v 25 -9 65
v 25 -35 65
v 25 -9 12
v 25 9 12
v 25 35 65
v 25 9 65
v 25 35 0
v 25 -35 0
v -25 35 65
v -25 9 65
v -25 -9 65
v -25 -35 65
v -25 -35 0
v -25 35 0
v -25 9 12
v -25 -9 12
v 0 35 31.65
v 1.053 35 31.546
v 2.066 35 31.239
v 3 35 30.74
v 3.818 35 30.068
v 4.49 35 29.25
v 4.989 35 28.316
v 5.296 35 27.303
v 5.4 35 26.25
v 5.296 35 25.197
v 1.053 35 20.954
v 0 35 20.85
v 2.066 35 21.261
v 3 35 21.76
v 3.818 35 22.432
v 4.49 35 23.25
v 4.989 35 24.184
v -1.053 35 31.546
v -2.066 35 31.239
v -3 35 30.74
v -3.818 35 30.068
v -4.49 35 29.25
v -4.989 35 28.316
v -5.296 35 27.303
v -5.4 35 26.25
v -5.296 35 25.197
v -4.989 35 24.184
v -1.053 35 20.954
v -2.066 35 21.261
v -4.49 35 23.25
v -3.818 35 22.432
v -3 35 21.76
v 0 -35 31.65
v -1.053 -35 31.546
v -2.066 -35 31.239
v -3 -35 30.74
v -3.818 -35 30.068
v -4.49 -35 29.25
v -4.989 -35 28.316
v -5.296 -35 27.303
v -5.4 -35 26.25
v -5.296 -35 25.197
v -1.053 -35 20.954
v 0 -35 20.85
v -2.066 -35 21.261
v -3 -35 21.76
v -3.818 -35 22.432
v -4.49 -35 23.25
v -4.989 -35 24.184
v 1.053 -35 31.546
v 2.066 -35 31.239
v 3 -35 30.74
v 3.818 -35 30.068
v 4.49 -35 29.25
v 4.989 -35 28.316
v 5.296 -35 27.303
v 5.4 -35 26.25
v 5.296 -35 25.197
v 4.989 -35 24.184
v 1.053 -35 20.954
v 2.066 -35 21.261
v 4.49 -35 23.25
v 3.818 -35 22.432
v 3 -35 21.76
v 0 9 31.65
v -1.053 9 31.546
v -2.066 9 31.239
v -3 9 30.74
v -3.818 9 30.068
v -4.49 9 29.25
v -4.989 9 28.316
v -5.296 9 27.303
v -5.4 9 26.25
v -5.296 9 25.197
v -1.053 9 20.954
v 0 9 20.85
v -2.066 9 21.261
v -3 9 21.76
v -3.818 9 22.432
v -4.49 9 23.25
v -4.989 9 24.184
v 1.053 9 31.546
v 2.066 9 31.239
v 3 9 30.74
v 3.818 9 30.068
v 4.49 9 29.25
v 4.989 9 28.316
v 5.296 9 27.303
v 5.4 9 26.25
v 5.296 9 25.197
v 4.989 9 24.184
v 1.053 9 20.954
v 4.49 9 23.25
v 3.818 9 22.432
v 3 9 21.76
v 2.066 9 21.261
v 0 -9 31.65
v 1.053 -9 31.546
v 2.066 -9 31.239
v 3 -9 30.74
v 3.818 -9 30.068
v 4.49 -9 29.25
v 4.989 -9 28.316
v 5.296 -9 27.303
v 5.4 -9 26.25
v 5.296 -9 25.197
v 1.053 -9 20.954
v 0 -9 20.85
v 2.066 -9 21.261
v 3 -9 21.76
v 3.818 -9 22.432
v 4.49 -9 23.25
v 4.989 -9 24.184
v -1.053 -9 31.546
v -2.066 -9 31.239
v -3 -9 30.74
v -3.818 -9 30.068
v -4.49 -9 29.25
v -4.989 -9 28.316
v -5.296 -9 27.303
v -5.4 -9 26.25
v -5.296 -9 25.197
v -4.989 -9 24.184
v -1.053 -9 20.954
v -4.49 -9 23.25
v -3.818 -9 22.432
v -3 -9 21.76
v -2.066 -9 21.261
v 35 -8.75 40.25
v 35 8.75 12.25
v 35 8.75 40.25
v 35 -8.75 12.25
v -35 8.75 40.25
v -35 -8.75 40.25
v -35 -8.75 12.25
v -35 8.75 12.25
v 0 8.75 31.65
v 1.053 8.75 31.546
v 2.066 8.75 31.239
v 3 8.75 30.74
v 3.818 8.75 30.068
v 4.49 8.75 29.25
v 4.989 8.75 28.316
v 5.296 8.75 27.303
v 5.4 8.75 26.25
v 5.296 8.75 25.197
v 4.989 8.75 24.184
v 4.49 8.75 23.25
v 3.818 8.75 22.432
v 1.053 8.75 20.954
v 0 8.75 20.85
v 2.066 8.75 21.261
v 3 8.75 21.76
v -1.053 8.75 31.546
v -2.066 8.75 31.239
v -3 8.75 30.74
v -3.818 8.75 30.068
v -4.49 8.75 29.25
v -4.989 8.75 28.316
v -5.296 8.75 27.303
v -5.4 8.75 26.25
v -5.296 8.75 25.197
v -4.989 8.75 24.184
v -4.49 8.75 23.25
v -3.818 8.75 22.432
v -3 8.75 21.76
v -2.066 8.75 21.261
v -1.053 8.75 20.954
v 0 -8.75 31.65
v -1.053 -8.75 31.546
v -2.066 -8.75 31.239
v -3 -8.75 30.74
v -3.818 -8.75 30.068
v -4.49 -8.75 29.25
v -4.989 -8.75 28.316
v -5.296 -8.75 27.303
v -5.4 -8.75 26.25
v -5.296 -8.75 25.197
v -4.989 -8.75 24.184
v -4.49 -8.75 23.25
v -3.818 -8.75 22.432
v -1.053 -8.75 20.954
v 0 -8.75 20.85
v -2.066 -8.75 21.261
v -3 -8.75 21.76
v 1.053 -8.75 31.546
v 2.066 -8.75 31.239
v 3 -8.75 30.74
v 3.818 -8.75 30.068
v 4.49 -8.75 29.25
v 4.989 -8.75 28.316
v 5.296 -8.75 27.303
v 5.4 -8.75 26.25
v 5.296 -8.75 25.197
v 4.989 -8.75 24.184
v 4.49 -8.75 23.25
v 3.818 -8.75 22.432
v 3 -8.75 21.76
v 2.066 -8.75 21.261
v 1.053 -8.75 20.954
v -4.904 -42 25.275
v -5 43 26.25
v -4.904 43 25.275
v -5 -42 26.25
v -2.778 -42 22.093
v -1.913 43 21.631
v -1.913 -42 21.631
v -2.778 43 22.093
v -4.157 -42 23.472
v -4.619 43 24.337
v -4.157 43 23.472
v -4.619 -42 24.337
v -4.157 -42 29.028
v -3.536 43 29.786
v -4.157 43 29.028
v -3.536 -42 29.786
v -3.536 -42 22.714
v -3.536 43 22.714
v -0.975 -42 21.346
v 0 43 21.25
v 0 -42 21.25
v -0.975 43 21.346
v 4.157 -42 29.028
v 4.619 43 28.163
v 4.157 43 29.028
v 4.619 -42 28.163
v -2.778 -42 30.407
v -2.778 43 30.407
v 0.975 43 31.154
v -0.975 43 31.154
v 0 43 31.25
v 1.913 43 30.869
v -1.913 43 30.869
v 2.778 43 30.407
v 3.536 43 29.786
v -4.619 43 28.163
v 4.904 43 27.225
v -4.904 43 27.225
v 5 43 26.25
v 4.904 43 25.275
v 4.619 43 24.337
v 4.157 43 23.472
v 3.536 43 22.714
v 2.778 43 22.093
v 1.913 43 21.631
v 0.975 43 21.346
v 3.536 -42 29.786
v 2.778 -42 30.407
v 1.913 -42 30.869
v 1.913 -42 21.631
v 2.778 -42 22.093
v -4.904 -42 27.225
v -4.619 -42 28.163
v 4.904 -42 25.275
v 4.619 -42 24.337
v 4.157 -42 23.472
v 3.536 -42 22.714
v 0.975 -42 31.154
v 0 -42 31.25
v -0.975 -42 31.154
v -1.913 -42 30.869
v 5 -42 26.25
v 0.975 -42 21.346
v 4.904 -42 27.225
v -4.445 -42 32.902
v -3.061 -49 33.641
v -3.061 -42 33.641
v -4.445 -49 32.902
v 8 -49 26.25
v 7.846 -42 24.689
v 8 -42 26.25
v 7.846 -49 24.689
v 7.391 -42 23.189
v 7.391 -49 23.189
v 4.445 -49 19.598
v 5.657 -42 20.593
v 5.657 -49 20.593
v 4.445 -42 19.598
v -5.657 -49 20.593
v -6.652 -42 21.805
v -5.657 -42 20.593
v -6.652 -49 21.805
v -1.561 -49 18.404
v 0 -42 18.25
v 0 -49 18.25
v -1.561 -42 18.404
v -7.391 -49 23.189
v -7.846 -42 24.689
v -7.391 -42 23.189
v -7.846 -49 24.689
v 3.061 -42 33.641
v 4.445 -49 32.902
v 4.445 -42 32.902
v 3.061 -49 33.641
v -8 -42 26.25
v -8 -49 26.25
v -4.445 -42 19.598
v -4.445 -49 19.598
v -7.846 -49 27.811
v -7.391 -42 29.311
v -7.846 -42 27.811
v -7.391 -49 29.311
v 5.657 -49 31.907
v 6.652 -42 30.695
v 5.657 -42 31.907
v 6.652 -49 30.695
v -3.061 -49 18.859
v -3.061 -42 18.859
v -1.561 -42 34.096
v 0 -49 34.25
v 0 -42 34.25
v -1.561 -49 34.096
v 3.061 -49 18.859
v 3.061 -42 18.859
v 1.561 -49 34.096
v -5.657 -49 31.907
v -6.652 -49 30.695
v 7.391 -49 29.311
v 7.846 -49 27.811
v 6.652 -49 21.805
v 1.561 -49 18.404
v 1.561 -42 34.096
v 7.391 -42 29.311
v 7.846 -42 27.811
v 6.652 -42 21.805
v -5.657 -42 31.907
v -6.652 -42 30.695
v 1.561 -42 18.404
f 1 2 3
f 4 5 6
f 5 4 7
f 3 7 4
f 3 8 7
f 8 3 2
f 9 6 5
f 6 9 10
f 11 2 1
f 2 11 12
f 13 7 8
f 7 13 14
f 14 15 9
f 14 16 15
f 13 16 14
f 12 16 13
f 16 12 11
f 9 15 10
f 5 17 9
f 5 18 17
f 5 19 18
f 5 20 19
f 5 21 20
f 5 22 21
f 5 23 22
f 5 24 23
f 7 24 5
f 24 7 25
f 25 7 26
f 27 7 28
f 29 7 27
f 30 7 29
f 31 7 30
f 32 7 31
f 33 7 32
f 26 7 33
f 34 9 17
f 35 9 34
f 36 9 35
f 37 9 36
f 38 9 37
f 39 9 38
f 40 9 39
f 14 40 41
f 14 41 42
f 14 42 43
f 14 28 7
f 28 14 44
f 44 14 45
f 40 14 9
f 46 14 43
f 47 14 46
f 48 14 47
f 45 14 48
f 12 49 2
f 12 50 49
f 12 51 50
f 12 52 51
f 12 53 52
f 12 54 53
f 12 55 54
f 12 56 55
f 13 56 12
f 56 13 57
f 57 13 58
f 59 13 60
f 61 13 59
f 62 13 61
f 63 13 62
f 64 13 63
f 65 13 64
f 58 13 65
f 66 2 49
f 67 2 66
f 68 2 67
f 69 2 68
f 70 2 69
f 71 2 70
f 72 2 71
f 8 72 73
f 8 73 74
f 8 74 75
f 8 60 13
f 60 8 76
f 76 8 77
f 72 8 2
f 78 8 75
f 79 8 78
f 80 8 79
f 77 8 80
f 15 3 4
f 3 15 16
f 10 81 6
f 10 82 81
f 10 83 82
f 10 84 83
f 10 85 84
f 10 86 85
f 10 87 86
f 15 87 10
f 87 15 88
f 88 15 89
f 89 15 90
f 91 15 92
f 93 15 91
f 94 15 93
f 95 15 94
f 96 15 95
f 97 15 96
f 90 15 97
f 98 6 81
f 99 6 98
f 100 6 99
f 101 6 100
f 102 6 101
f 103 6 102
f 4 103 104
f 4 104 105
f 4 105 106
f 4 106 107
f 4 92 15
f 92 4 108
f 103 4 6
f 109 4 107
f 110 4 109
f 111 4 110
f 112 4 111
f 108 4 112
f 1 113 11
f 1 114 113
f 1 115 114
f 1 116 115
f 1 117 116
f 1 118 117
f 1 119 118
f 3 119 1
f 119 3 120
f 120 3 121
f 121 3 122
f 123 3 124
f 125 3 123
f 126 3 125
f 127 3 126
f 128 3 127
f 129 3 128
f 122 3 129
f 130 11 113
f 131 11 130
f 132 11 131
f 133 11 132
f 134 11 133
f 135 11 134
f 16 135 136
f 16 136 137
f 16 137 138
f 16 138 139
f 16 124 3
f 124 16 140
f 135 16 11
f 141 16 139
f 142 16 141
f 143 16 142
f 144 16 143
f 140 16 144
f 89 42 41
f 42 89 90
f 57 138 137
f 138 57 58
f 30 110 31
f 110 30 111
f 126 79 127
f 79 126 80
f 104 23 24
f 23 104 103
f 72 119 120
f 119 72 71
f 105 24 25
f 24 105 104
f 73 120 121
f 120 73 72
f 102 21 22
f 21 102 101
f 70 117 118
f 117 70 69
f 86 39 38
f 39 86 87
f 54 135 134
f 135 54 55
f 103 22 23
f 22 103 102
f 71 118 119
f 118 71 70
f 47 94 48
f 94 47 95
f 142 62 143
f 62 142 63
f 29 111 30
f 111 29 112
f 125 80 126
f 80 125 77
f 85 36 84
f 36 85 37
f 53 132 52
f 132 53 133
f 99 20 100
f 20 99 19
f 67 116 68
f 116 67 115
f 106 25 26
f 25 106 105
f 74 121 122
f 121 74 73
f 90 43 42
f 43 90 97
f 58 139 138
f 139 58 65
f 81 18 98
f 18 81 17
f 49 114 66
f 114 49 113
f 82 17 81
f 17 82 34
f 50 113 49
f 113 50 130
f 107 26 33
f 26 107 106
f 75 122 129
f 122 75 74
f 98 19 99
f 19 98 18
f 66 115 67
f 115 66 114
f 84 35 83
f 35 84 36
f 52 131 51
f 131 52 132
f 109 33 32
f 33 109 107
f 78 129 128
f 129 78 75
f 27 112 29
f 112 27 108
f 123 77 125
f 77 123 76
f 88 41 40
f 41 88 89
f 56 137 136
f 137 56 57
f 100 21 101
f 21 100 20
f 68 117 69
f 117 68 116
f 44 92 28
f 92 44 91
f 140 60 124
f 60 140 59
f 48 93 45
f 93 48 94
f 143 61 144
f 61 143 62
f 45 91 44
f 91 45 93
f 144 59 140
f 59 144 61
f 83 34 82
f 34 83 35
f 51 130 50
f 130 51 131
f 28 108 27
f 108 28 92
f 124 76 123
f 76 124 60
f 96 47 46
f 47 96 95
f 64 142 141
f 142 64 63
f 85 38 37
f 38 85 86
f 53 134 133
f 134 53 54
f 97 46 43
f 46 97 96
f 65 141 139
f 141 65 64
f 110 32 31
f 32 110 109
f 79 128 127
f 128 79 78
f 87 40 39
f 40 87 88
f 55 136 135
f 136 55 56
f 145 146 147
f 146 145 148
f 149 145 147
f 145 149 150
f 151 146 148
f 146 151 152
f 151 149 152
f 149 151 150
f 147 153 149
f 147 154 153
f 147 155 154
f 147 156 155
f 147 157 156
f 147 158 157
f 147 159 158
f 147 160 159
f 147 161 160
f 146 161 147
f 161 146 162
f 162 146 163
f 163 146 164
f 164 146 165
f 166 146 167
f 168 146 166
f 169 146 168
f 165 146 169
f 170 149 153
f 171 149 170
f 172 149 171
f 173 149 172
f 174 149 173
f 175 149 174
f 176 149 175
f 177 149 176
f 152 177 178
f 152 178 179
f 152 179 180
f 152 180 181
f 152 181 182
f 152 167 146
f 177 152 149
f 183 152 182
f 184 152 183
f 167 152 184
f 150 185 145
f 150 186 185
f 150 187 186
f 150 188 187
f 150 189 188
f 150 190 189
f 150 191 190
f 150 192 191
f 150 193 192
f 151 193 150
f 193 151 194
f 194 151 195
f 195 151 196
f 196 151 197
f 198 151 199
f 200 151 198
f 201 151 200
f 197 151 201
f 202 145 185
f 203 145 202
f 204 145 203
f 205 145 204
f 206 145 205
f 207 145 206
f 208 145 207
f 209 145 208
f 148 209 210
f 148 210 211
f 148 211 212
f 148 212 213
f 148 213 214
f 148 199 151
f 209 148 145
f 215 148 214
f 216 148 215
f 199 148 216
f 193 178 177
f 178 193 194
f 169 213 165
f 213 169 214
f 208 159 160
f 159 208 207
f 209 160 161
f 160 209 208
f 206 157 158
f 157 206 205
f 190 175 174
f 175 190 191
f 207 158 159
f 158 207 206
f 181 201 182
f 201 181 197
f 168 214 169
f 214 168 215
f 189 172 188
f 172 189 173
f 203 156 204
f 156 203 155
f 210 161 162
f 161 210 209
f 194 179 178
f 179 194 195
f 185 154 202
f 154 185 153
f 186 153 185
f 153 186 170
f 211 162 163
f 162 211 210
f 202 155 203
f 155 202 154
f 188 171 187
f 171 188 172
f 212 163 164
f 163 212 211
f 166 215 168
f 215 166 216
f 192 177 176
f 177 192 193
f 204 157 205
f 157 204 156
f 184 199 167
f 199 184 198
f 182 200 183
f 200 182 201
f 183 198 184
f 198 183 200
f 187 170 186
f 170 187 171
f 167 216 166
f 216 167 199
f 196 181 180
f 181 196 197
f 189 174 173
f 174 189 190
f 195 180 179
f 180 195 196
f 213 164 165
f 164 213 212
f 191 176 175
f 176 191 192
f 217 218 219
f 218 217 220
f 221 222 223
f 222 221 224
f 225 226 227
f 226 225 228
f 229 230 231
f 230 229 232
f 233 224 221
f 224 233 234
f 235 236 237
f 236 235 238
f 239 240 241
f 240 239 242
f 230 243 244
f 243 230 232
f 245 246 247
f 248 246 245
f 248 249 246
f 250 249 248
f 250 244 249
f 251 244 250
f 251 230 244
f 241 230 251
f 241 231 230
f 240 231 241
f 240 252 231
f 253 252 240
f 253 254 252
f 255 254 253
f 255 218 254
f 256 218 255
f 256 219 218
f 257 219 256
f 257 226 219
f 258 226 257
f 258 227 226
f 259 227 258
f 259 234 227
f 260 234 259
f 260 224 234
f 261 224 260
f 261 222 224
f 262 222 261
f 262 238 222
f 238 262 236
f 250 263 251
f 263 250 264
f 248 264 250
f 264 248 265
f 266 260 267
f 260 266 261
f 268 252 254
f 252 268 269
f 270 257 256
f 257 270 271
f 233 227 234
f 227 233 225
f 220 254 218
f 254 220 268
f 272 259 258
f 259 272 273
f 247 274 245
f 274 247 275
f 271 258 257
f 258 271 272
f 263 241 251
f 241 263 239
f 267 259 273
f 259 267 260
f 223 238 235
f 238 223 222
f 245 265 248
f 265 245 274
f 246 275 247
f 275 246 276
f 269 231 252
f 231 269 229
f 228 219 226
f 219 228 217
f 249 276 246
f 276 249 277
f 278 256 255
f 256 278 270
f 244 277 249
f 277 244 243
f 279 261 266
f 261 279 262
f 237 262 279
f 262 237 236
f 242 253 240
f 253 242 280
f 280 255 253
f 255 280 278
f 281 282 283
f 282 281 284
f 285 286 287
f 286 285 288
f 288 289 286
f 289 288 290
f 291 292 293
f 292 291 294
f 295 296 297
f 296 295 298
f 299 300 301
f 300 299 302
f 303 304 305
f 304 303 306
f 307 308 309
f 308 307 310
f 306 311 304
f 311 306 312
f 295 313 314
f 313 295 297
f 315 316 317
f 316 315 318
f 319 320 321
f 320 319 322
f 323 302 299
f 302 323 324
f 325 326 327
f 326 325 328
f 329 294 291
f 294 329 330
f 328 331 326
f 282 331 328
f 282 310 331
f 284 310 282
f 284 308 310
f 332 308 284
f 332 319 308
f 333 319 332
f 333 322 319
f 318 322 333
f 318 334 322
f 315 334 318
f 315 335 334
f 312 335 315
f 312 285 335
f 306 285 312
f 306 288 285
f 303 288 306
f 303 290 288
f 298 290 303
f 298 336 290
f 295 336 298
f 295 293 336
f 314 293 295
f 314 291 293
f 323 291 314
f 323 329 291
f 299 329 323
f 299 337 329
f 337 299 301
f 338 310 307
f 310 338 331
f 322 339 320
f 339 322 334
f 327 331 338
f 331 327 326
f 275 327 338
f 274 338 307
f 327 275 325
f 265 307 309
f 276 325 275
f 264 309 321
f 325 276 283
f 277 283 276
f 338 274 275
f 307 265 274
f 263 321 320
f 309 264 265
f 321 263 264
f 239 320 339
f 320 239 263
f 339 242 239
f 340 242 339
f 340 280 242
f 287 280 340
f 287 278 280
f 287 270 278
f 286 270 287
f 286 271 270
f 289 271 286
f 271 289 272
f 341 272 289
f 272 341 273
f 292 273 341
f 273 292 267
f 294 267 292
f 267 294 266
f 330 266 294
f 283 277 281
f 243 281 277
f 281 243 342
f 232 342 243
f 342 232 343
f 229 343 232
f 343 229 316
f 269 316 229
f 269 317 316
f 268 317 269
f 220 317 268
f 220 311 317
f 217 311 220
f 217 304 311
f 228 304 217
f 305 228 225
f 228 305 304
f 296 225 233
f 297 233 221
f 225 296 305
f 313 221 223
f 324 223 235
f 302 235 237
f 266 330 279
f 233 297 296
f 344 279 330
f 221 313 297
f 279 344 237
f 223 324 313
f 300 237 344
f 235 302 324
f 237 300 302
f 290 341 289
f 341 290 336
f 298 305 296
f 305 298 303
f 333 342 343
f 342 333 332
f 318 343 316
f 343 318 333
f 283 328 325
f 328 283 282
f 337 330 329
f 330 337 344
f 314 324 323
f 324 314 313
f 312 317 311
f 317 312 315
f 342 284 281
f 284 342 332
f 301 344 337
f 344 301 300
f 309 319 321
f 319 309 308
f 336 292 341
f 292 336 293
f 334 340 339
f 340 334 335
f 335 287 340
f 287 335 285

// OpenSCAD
$fn = 32;

// ------------------------------------------------------------------------
// Clevis joint: 50 mm clevis, pin d10
// Every part is its own module, assembly() places them once.
// ------------------------------------------------------------------------

// --- part 1 ---
module clevis() {
  difference() {
    translate([-25, -35, 0]) cube([50, 70, 65]);
    translate([-26, -9, 12]) cube([52, 18, 54]);
    translate([0, 0, 26.25]) rotate([90, 0, 0]) cylinder(h = 72, d = 10.8, center = true);
  }
}

// --- part 2 ---
module eye() {
  difference() {
    translate([-35, -8.75, 0]) cube([70, 17.5, 28]);
    translate([0, 0, 14]) rotate([90, 0, 0]) cylinder(h = 19.5, d = 10.8, center = true);
  }
}

// --- part 3 ---
module pin() {
  rotate([0, 90, 0]) cylinder(h = 86, d = 10, center = true);
  translate([-49, 0, 0]) rotate([0, 90, 0]) cylinder(h = 7, d = 16);
}

// --- assembly ---
module assembly() {
  translate([0, 0, 0]) rotate([0, 0, 0]) clevis();
  translate([0, 0, 12.25]) rotate([0, 0, 0]) eye();
  translate([0, 0, 26.25]) rotate([0, 0, 90]) pin();
}

assembly();
